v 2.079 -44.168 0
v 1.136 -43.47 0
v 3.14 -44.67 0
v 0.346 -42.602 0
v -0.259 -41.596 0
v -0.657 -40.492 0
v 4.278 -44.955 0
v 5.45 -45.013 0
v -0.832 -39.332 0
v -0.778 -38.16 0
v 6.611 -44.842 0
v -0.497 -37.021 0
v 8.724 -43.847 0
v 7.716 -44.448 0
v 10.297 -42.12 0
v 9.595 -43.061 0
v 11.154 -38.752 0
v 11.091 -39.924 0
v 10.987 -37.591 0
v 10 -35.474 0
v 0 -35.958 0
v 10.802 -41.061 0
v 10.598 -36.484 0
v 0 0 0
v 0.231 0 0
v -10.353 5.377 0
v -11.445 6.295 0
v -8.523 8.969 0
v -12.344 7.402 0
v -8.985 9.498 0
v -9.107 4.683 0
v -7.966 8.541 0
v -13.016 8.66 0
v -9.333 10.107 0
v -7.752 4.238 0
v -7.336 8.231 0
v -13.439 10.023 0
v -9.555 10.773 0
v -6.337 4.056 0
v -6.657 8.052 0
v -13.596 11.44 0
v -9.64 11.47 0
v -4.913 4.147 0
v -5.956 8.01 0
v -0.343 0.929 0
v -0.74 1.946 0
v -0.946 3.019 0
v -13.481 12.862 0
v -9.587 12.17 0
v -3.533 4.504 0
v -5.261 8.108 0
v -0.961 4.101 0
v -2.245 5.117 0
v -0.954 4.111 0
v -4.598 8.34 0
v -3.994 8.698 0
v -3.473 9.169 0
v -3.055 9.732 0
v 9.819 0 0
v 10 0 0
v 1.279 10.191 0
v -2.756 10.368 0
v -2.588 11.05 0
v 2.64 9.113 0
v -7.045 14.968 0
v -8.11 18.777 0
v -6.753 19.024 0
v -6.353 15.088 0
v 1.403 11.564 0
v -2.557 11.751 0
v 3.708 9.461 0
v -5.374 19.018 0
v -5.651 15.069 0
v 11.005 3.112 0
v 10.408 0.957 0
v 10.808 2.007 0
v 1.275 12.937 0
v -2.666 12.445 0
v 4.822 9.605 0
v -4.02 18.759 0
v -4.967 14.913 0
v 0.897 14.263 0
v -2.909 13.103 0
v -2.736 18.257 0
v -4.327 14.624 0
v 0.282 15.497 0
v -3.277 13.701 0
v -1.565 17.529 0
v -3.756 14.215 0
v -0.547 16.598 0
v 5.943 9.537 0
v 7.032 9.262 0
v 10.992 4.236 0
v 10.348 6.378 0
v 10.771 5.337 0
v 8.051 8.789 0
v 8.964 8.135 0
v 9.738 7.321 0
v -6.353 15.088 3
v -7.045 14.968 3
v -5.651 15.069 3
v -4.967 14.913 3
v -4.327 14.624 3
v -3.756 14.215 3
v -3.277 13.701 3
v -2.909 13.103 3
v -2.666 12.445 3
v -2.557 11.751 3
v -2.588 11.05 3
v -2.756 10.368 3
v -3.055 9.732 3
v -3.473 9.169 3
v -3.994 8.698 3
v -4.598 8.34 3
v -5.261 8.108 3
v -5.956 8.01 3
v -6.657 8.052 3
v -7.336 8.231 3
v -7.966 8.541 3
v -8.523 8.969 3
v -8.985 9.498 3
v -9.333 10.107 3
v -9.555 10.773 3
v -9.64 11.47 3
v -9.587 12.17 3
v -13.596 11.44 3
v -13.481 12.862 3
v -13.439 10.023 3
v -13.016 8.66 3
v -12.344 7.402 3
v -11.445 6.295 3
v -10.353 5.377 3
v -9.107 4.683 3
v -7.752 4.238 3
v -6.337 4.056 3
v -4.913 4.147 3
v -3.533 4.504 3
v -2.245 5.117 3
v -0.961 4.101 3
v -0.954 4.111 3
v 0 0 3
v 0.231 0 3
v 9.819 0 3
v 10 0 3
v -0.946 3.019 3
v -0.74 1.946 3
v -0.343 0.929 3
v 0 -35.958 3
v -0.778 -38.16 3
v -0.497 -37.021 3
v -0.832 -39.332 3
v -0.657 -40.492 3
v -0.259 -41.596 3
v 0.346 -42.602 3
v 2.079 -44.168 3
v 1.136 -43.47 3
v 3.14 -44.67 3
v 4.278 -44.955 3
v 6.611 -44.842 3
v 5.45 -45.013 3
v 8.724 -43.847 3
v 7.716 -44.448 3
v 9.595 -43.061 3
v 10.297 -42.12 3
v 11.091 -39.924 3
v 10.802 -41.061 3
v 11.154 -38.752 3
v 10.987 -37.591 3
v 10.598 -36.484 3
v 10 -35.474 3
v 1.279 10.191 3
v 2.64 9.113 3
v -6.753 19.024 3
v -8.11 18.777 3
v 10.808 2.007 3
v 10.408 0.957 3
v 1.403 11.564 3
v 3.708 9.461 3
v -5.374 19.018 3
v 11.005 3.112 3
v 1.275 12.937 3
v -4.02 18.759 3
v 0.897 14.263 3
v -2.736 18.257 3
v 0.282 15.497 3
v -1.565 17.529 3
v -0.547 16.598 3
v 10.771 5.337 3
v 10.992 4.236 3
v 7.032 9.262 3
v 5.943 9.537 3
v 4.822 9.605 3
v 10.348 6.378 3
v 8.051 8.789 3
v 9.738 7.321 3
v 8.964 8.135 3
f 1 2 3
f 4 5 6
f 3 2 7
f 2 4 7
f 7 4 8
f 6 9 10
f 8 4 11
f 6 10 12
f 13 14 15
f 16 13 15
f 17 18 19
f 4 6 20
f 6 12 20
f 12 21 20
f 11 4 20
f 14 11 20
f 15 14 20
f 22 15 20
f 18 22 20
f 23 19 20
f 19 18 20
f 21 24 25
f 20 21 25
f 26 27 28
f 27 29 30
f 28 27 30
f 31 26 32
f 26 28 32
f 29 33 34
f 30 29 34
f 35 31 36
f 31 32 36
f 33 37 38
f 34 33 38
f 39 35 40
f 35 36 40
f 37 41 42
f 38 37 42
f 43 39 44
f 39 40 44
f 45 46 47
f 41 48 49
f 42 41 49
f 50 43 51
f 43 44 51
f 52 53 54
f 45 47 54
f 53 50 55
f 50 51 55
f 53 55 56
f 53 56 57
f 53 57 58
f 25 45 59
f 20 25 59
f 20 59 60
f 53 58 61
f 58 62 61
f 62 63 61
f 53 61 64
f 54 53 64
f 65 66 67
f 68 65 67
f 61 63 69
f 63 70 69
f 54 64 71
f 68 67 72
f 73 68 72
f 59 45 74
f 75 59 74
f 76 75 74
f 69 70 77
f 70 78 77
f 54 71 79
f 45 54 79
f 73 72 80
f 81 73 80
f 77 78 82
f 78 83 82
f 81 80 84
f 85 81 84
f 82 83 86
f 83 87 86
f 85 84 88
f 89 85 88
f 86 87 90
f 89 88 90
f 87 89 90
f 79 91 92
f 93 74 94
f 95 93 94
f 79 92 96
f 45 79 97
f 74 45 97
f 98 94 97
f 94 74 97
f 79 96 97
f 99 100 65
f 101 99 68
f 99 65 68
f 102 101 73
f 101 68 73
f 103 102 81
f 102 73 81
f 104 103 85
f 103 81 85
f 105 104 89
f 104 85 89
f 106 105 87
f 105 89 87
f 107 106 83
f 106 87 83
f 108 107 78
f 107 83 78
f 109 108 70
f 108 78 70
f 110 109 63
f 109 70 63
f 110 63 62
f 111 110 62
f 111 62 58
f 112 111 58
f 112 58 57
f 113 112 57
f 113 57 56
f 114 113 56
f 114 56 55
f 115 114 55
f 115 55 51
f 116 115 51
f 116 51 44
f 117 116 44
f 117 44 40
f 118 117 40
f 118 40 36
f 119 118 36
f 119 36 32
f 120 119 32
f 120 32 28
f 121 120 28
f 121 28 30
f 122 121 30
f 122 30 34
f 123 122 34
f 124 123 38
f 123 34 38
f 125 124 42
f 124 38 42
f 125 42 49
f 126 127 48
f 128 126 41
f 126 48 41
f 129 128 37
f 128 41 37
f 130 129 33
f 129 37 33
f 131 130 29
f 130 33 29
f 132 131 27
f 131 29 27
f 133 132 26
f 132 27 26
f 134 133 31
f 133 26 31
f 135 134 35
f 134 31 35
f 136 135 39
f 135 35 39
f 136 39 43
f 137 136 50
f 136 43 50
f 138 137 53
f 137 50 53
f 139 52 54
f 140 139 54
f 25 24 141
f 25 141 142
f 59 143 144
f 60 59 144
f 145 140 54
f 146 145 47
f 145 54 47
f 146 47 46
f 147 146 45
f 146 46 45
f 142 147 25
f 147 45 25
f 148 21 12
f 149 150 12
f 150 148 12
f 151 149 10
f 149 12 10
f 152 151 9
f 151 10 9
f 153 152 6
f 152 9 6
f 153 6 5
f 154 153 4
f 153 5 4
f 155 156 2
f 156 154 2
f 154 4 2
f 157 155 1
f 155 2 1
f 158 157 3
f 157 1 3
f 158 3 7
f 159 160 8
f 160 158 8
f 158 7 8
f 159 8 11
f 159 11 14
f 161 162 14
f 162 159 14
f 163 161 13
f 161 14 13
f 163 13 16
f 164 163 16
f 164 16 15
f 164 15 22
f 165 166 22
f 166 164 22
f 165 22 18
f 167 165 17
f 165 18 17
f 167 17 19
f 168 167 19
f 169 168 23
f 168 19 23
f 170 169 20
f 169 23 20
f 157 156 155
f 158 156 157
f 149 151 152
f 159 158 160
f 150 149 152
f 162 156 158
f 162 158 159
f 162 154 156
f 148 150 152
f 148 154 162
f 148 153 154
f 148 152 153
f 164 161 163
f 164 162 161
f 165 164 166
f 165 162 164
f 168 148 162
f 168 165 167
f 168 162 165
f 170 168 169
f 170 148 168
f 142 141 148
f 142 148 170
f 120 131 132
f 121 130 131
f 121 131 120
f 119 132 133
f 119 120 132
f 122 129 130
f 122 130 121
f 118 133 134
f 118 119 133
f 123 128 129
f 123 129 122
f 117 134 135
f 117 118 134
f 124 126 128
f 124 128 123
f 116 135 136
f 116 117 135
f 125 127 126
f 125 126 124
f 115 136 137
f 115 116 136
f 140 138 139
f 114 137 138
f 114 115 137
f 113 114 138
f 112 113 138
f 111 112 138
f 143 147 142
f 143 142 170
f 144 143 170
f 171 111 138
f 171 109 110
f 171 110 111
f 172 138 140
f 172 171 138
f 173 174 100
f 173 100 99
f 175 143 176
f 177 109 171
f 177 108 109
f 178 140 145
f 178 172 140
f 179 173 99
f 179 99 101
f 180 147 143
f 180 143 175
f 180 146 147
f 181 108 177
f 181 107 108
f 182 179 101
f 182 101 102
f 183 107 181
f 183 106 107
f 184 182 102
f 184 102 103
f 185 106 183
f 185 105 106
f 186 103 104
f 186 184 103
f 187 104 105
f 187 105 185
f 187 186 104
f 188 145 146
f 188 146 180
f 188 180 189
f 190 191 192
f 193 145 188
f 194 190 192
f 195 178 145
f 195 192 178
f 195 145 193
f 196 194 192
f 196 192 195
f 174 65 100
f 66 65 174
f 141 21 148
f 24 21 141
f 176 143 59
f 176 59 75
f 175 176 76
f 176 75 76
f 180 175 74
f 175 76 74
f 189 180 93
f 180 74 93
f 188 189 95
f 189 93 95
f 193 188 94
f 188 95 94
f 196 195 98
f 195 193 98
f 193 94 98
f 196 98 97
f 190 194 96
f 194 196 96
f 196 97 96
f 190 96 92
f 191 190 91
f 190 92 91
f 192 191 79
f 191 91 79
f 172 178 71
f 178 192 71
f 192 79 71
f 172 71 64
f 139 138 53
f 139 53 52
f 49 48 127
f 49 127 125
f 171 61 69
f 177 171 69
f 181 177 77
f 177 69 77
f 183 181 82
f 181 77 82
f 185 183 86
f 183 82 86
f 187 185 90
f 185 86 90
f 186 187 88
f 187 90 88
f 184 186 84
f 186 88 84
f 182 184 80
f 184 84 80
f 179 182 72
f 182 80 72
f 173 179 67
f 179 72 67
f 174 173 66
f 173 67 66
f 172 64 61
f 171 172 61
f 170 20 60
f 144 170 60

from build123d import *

# Parameters (mm, degrees)
F0_W      = 10
F0_H      = 36
F3_DEPTH  = 3
F2_R      = 6
F4_DEPTH  = 3
F1_R      = 6
F5_DEPTH  = 3
F7_R      = 7.5
F9_DEPTH  = 3
F10_DEPTH = 3
F12_R     = 3.5448933786
F13_DEPTH = 25


with BuildPart() as f3:
    # F0 (on Top) → F3 (new body)
    with BuildSketch(Plane.XY):
        with Locations((5, -18)):
            Rectangle(F0_W, F0_H)
    extrude(amount=F3_DEPTH)

    # F2 (on Top) → F4 (join)
    with BuildSketch(Plane.XY):
        with Locations((5.1598995924, -39.019856602)):
            Circle(F2_R)
    extrude(amount=F4_DEPTH)

    # F1 (on Top) → F5 (join)
    with BuildSketch(Plane.XY):
        with Locations((5.0253178924, 3.6079895217)):
            Circle(F1_R)
    extrude(amount=F5_DEPTH)


with BuildPart() as f9:
    # F7 (on Top) → F9 (new body)
    with BuildSketch(Plane.XY):
        with Locations((-6.096528843, 11.5525964648)):
            Circle(F7_R)
    extrude(amount=F9_DEPTH)


with BuildPart() as f10:
    # F6 (on Top) → F10 (new body)
    with BuildSketch(Plane.XY):
        Polygon((-0.9610534762, 4.1011222638), (2.8653789777, 8.9345108718), (1.0522136364, 10.3699333609), (-2.9573408003, 5.6815163153), align=None)
    extrude(amount=F10_DEPTH)


with BuildPart() as f9_1:
    add(f9.part)

    # F11: union F3, F10
    add(f3.part)
    add(f10.part)

    # F8 (on Top) + F12 (on face) → F13 (cut)
    with BuildSketch(Plane.XY):
        Polygon((-19.6032542735, 13.9494352043), (-6.0890447348, 11.5491952747), (-9.477134794, 23.6695185304), align=None)
    with BuildSketch(Plane(origin=(0, 0, 0), x_dir=(1, 0, 0), z_dir=(0, 0, -1))):
        with Locations((-6.096528843, -11.5525964648)):
            Circle(F12_R)
    extrude(amount=F13_DEPTH, dir=(0, 0, 1), mode=Mode.SUBTRACT)


solid = f9_1.part
